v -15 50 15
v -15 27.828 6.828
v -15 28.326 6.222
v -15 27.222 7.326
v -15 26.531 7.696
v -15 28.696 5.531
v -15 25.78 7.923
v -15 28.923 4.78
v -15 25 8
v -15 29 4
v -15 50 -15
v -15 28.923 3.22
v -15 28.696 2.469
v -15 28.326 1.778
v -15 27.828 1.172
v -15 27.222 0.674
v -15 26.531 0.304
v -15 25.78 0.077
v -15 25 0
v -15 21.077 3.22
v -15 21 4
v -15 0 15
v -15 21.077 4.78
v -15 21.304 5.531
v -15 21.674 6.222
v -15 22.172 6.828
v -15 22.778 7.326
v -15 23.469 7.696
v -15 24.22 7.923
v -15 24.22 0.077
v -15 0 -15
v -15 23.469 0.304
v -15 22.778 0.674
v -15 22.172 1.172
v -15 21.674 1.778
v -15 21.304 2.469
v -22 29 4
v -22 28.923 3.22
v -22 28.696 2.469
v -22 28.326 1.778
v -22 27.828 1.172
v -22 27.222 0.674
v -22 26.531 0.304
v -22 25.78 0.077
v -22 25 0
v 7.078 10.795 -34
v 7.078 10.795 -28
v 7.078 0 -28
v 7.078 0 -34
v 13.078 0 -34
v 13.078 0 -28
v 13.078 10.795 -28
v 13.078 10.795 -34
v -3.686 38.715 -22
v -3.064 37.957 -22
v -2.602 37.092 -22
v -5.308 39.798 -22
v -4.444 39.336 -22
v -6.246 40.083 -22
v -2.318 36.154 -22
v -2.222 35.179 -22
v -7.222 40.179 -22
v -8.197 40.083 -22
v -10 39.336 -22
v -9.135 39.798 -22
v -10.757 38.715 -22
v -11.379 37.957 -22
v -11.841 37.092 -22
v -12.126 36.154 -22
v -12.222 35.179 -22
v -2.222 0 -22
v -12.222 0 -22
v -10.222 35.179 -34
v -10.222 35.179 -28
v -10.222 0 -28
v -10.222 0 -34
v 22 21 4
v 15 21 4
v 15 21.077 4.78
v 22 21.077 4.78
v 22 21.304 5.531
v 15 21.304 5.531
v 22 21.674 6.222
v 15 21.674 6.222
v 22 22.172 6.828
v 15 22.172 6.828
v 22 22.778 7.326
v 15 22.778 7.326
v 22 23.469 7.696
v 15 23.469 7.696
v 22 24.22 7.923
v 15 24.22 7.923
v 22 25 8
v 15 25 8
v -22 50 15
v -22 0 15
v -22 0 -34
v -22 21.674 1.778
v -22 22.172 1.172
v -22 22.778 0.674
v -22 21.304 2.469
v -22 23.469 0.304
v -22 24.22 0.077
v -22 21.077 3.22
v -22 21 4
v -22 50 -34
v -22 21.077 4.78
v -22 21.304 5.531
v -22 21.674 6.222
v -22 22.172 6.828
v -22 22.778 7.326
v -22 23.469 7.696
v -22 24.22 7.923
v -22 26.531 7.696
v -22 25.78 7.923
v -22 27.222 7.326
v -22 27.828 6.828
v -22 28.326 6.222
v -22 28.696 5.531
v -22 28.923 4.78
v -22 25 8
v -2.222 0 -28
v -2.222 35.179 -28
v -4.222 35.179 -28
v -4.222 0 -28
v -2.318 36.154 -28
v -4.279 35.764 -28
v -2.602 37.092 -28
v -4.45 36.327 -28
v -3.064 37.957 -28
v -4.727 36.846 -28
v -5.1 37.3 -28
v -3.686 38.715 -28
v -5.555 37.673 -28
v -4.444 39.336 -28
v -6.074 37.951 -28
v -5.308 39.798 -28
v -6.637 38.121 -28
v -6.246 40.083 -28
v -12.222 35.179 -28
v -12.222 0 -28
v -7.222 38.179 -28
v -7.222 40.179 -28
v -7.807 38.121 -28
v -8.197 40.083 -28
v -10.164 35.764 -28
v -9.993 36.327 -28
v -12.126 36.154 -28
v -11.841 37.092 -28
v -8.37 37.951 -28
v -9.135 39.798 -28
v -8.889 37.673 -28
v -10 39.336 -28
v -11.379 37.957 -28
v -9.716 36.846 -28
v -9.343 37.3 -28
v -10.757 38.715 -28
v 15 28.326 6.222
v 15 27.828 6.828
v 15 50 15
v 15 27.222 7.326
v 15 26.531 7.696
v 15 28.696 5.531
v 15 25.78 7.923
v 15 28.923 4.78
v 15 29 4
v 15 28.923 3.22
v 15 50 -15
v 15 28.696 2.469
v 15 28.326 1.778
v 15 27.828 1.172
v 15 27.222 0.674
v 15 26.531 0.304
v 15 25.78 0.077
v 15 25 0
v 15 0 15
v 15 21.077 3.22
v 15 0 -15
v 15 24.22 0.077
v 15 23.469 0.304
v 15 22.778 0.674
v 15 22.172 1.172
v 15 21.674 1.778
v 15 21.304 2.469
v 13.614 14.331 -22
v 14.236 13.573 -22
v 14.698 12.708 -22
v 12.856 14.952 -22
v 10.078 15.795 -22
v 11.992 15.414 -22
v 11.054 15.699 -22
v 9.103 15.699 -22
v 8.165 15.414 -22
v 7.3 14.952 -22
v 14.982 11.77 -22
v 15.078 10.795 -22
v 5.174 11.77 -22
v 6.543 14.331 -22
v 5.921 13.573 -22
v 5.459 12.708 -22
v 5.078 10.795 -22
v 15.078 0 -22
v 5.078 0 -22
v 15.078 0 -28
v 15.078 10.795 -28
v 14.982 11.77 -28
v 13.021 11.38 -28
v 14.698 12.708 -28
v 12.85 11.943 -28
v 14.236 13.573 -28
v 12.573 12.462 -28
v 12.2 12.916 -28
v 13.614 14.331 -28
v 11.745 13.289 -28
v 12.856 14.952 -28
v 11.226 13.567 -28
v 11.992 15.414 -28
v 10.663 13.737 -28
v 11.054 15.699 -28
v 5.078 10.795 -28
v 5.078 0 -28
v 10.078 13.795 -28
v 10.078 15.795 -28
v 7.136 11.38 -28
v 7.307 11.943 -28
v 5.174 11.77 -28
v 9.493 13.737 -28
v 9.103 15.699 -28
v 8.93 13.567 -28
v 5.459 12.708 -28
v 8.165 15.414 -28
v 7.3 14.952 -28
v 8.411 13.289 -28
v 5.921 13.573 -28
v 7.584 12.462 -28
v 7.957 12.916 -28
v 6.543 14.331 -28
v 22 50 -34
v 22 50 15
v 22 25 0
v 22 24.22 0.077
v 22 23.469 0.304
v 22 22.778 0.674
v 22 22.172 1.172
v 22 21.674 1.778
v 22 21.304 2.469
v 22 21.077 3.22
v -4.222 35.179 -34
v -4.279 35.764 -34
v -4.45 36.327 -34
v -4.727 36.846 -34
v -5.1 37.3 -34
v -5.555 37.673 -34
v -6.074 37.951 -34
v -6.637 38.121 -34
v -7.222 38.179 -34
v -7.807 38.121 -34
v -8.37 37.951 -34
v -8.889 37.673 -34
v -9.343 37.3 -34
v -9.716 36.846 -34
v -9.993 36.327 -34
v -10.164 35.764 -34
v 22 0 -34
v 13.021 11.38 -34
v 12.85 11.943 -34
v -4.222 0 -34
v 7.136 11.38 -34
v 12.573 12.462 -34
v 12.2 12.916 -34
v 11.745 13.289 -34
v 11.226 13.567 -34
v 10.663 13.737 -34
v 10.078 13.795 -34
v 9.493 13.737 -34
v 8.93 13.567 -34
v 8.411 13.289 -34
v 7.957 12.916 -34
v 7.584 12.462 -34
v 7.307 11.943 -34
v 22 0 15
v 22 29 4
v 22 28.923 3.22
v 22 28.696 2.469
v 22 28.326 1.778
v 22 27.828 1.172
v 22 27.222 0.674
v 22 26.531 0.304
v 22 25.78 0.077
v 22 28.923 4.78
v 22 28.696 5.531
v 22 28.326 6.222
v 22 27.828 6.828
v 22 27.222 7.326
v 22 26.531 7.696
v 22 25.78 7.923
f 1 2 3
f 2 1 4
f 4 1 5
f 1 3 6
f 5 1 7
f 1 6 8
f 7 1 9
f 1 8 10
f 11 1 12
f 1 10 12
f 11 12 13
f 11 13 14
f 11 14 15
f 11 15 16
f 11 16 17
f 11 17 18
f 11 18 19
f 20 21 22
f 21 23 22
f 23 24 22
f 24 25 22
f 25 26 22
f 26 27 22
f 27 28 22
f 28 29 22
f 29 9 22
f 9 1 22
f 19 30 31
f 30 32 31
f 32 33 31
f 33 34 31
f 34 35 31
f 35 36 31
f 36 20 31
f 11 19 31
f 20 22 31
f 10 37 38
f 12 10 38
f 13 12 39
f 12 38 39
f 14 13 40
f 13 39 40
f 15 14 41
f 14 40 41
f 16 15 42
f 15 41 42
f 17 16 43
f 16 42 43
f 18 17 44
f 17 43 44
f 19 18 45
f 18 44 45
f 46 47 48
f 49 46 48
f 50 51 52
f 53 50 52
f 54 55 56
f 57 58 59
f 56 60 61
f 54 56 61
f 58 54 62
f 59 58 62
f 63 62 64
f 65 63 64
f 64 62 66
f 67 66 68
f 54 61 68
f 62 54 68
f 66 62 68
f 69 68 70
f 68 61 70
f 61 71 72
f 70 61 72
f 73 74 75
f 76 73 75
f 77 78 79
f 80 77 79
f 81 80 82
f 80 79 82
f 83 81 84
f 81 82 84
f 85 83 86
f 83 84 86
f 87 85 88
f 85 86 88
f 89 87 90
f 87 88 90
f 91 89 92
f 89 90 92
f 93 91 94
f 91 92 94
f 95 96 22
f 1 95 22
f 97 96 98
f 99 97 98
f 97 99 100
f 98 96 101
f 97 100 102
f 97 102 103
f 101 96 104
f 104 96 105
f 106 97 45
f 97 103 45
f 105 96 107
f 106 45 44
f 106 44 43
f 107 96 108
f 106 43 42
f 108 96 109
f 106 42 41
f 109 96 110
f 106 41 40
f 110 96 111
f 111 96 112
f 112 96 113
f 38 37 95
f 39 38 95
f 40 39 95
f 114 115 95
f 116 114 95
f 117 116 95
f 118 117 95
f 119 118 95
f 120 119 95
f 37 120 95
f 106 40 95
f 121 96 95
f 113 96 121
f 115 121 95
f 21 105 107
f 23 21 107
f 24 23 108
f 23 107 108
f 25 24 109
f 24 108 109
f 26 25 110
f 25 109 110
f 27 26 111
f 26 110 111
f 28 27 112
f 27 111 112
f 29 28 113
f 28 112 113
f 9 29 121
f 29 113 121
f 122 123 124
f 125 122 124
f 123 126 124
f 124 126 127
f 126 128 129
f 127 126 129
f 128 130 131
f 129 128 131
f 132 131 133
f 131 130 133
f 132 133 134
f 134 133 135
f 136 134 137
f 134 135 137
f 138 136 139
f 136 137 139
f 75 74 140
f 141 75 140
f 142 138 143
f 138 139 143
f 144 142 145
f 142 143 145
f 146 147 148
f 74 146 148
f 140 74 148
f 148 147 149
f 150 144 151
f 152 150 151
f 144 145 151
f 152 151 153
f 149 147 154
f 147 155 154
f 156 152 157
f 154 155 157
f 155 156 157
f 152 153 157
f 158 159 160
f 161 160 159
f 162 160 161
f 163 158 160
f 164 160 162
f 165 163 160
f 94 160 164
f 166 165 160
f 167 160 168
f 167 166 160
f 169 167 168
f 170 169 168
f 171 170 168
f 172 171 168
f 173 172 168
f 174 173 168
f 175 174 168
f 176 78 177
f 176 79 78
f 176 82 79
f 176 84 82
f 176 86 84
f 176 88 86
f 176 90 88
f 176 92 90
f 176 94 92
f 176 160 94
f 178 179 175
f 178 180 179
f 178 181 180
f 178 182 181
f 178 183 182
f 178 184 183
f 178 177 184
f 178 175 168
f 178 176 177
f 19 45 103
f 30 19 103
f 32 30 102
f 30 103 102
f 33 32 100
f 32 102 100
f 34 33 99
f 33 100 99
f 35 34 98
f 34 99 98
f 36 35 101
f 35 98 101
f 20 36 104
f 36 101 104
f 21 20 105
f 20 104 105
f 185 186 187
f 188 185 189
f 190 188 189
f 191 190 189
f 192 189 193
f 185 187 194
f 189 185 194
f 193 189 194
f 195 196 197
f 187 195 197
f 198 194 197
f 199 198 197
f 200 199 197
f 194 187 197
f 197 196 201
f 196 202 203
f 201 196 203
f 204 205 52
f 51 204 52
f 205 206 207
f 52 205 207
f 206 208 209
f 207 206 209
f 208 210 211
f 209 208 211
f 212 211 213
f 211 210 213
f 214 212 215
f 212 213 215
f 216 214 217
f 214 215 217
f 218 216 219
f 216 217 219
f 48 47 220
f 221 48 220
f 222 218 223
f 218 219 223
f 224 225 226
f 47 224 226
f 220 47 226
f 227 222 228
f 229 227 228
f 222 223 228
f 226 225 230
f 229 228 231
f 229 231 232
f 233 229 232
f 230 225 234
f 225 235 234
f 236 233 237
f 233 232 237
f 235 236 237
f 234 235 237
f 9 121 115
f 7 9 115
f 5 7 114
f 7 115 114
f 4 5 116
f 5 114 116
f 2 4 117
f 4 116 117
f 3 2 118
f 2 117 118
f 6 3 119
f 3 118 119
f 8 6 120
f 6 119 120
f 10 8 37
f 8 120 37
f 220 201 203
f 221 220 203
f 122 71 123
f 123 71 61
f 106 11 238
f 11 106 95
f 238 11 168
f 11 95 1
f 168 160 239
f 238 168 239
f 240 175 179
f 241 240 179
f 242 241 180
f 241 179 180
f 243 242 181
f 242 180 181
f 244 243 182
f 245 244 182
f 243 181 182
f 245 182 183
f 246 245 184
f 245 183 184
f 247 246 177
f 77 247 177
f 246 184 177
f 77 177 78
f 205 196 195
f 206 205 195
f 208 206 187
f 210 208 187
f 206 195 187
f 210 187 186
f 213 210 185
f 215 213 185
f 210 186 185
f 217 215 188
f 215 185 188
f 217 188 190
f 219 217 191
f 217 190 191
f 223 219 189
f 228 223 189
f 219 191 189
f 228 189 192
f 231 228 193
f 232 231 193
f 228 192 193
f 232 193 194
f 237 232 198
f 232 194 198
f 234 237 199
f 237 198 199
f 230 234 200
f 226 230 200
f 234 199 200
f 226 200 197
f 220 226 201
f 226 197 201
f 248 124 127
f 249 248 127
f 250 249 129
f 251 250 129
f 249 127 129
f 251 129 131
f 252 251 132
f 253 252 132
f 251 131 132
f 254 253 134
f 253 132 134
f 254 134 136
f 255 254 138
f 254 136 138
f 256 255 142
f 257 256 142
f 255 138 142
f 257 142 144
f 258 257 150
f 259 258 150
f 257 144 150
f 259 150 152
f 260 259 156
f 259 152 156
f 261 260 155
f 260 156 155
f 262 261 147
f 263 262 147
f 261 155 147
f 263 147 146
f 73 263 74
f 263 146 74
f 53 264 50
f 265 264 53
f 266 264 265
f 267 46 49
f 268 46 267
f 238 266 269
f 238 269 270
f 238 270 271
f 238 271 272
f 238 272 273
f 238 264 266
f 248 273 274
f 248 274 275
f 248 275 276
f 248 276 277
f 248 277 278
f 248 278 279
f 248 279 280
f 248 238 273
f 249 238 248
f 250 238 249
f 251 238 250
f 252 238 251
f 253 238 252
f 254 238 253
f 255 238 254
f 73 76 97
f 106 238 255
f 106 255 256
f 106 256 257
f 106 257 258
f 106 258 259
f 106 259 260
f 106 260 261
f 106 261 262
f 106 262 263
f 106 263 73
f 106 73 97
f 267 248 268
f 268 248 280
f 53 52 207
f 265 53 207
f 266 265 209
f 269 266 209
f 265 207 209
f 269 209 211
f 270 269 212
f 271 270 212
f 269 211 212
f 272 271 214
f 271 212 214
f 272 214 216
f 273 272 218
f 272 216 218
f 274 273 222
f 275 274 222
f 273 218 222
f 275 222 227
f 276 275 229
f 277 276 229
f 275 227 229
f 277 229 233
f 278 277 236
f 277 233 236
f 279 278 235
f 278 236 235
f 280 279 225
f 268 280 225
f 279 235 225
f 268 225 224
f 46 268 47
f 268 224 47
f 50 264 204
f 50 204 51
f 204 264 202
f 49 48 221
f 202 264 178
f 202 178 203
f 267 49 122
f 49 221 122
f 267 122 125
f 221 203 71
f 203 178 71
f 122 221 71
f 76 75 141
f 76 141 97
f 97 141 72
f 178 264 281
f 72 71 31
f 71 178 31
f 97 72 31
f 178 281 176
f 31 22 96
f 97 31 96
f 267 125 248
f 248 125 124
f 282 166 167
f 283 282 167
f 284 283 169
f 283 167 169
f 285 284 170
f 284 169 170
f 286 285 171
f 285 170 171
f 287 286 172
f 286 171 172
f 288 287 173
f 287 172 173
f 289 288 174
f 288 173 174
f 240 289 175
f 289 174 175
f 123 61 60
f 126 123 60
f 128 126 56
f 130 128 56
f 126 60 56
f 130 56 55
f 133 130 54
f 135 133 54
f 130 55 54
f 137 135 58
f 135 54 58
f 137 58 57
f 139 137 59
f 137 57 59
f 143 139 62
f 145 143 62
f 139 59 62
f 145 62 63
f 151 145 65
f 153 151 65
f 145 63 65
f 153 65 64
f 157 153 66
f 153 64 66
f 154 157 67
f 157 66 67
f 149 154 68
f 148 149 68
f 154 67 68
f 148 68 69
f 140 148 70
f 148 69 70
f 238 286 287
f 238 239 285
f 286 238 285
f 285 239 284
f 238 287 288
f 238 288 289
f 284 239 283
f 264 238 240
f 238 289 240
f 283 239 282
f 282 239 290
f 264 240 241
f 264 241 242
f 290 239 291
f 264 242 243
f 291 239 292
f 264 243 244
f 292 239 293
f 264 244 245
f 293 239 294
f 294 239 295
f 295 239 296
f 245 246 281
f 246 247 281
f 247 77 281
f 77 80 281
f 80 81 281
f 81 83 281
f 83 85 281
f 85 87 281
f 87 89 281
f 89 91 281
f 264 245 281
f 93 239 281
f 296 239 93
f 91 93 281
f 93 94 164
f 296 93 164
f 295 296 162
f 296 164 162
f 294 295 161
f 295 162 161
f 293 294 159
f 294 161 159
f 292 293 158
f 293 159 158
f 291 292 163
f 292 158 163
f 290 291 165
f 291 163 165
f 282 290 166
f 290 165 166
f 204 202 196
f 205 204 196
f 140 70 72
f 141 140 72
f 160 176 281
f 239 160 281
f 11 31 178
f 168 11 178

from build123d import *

# Parameters (mm, degrees)
SKETCH1_W           = 7
SKETCH1_H           = 30
BOSS_EXTRUDE1_DEPTH = 50
BOSS_EXTRUDE2_DEPTH = 6
BOSS_EXTRUDE3_DEPTH = 6
CUT_EXTRUDE1_DEPTH  = 75.779676383


with BuildPart() as part:
    # Sketch1 → Boss-Extrude1 (new body)
    with BuildSketch(Plane(origin=(0, 0, 0), x_dir=(1, 0, 0), z_dir=(0, 1, 0))):
        Polygon((-15, -15), (-15, 15), (-15, 22), (-22, 22), (-22, -15), align=None)
        Polygon((-15, 22), (-15, 15), (15, 15), (22, 15), (22, 22), align=None)
        with Locations((18.5, 0)):
            Rectangle(SKETCH1_W, SKETCH1_H)
    extrude(amount=BOSS_EXTRUDE1_DEPTH)

    # Sketch2 → Boss-Extrude2 (add)
    with BuildSketch(Plane(origin=(0, 0, -22), x_dir=(-1, 0, 0), z_dir=(0, 0, -1))):
        with BuildLine():
            Line((12.221813484, 35.179), (12.221813484, 0))
            Line((12.221813484, 0), (22, 0))
            Line((22, 0), (22, 50))
            Line((22, 50), (-22, 50))
            Line((-22, 50), (-22, 0))
            Line((-22, 0), (-15.078186516, 0))
            Line((-15.078186516, 0), (-15.078186516, 10.795))
            ThreePointArc((-15.078186516, 10.795), (-10.078186516, 15.795), (-5.078186516, 10.795))
            Line((-5.078186516, 10.795), (-5.078186516, 0))
            Line((-5.078186516, 0), (2.221813484, 0))
            Line((2.221813484, 0), (2.221813484, 35.179))
            ThreePointArc((2.221813484, 35.179), (7.221813484, 40.179), (12.221813484, 35.179))
        make_face()
    extrude(amount=BOSS_EXTRUDE2_DEPTH)

    # Sketch3 → Boss-Extrude3 (add)
    with BuildSketch(Plane(origin=(0, 0, -28), x_dir=(-1, 0, 0), z_dir=(0, 0, -1))):
        with BuildLine():
            Line((-7.078186516, 10.795), (-7.078186516, 0))
            Line((-7.078186516, 0), (4.221813484, 0))
            Line((4.221813484, 0), (4.221813484, 35.179))
            ThreePointArc((4.221813484, 35.179), (7.221813484, 38.179), (10.221813484, 35.179))
            Line((10.221813484, 35.179), (10.221813484, 0))
            Line((10.221813484, 0), (22, 0))
            Line((22, 0), (22, 50))
            Line((22, 50), (-22, 50))
            Line((-22, 50), (-22, 0))
            Line((-22, 0), (-13.078186516, 0))
            Line((-13.078186516, 0), (-13.078186516, 10.795))
            ThreePointArc((-13.078186516, 10.795), (-10.078186516, 13.795), (-7.078186516, 10.795))
        make_face()
    extrude(amount=BOSS_EXTRUDE3_DEPTH)

    # Sketch5 → Cut-Extrude1 (cut, through all)
    with BuildSketch(Plane.ZY.offset(22)):
        with BuildLine():
            ThreePointArc((0, 25), (1.171572875, 22.171572875), (4, 21))
            Line((4, 21), (4, 29))
            ThreePointArc((4, 29), (1.171572875, 27.828427125), (0, 25))
        make_face()
        with BuildLine():
            Line((4, 29), (4, 21))
            ThreePointArc((4, 21), (6.828427125, 22.171572875), (8, 25))
            ThreePointArc((8, 25), (6.828427125, 27.828427125), (4, 29))
        make_face()
    extrude(amount=-CUT_EXTRUDE1_DEPTH, mode=Mode.SUBTRACT)


solid = part.part
